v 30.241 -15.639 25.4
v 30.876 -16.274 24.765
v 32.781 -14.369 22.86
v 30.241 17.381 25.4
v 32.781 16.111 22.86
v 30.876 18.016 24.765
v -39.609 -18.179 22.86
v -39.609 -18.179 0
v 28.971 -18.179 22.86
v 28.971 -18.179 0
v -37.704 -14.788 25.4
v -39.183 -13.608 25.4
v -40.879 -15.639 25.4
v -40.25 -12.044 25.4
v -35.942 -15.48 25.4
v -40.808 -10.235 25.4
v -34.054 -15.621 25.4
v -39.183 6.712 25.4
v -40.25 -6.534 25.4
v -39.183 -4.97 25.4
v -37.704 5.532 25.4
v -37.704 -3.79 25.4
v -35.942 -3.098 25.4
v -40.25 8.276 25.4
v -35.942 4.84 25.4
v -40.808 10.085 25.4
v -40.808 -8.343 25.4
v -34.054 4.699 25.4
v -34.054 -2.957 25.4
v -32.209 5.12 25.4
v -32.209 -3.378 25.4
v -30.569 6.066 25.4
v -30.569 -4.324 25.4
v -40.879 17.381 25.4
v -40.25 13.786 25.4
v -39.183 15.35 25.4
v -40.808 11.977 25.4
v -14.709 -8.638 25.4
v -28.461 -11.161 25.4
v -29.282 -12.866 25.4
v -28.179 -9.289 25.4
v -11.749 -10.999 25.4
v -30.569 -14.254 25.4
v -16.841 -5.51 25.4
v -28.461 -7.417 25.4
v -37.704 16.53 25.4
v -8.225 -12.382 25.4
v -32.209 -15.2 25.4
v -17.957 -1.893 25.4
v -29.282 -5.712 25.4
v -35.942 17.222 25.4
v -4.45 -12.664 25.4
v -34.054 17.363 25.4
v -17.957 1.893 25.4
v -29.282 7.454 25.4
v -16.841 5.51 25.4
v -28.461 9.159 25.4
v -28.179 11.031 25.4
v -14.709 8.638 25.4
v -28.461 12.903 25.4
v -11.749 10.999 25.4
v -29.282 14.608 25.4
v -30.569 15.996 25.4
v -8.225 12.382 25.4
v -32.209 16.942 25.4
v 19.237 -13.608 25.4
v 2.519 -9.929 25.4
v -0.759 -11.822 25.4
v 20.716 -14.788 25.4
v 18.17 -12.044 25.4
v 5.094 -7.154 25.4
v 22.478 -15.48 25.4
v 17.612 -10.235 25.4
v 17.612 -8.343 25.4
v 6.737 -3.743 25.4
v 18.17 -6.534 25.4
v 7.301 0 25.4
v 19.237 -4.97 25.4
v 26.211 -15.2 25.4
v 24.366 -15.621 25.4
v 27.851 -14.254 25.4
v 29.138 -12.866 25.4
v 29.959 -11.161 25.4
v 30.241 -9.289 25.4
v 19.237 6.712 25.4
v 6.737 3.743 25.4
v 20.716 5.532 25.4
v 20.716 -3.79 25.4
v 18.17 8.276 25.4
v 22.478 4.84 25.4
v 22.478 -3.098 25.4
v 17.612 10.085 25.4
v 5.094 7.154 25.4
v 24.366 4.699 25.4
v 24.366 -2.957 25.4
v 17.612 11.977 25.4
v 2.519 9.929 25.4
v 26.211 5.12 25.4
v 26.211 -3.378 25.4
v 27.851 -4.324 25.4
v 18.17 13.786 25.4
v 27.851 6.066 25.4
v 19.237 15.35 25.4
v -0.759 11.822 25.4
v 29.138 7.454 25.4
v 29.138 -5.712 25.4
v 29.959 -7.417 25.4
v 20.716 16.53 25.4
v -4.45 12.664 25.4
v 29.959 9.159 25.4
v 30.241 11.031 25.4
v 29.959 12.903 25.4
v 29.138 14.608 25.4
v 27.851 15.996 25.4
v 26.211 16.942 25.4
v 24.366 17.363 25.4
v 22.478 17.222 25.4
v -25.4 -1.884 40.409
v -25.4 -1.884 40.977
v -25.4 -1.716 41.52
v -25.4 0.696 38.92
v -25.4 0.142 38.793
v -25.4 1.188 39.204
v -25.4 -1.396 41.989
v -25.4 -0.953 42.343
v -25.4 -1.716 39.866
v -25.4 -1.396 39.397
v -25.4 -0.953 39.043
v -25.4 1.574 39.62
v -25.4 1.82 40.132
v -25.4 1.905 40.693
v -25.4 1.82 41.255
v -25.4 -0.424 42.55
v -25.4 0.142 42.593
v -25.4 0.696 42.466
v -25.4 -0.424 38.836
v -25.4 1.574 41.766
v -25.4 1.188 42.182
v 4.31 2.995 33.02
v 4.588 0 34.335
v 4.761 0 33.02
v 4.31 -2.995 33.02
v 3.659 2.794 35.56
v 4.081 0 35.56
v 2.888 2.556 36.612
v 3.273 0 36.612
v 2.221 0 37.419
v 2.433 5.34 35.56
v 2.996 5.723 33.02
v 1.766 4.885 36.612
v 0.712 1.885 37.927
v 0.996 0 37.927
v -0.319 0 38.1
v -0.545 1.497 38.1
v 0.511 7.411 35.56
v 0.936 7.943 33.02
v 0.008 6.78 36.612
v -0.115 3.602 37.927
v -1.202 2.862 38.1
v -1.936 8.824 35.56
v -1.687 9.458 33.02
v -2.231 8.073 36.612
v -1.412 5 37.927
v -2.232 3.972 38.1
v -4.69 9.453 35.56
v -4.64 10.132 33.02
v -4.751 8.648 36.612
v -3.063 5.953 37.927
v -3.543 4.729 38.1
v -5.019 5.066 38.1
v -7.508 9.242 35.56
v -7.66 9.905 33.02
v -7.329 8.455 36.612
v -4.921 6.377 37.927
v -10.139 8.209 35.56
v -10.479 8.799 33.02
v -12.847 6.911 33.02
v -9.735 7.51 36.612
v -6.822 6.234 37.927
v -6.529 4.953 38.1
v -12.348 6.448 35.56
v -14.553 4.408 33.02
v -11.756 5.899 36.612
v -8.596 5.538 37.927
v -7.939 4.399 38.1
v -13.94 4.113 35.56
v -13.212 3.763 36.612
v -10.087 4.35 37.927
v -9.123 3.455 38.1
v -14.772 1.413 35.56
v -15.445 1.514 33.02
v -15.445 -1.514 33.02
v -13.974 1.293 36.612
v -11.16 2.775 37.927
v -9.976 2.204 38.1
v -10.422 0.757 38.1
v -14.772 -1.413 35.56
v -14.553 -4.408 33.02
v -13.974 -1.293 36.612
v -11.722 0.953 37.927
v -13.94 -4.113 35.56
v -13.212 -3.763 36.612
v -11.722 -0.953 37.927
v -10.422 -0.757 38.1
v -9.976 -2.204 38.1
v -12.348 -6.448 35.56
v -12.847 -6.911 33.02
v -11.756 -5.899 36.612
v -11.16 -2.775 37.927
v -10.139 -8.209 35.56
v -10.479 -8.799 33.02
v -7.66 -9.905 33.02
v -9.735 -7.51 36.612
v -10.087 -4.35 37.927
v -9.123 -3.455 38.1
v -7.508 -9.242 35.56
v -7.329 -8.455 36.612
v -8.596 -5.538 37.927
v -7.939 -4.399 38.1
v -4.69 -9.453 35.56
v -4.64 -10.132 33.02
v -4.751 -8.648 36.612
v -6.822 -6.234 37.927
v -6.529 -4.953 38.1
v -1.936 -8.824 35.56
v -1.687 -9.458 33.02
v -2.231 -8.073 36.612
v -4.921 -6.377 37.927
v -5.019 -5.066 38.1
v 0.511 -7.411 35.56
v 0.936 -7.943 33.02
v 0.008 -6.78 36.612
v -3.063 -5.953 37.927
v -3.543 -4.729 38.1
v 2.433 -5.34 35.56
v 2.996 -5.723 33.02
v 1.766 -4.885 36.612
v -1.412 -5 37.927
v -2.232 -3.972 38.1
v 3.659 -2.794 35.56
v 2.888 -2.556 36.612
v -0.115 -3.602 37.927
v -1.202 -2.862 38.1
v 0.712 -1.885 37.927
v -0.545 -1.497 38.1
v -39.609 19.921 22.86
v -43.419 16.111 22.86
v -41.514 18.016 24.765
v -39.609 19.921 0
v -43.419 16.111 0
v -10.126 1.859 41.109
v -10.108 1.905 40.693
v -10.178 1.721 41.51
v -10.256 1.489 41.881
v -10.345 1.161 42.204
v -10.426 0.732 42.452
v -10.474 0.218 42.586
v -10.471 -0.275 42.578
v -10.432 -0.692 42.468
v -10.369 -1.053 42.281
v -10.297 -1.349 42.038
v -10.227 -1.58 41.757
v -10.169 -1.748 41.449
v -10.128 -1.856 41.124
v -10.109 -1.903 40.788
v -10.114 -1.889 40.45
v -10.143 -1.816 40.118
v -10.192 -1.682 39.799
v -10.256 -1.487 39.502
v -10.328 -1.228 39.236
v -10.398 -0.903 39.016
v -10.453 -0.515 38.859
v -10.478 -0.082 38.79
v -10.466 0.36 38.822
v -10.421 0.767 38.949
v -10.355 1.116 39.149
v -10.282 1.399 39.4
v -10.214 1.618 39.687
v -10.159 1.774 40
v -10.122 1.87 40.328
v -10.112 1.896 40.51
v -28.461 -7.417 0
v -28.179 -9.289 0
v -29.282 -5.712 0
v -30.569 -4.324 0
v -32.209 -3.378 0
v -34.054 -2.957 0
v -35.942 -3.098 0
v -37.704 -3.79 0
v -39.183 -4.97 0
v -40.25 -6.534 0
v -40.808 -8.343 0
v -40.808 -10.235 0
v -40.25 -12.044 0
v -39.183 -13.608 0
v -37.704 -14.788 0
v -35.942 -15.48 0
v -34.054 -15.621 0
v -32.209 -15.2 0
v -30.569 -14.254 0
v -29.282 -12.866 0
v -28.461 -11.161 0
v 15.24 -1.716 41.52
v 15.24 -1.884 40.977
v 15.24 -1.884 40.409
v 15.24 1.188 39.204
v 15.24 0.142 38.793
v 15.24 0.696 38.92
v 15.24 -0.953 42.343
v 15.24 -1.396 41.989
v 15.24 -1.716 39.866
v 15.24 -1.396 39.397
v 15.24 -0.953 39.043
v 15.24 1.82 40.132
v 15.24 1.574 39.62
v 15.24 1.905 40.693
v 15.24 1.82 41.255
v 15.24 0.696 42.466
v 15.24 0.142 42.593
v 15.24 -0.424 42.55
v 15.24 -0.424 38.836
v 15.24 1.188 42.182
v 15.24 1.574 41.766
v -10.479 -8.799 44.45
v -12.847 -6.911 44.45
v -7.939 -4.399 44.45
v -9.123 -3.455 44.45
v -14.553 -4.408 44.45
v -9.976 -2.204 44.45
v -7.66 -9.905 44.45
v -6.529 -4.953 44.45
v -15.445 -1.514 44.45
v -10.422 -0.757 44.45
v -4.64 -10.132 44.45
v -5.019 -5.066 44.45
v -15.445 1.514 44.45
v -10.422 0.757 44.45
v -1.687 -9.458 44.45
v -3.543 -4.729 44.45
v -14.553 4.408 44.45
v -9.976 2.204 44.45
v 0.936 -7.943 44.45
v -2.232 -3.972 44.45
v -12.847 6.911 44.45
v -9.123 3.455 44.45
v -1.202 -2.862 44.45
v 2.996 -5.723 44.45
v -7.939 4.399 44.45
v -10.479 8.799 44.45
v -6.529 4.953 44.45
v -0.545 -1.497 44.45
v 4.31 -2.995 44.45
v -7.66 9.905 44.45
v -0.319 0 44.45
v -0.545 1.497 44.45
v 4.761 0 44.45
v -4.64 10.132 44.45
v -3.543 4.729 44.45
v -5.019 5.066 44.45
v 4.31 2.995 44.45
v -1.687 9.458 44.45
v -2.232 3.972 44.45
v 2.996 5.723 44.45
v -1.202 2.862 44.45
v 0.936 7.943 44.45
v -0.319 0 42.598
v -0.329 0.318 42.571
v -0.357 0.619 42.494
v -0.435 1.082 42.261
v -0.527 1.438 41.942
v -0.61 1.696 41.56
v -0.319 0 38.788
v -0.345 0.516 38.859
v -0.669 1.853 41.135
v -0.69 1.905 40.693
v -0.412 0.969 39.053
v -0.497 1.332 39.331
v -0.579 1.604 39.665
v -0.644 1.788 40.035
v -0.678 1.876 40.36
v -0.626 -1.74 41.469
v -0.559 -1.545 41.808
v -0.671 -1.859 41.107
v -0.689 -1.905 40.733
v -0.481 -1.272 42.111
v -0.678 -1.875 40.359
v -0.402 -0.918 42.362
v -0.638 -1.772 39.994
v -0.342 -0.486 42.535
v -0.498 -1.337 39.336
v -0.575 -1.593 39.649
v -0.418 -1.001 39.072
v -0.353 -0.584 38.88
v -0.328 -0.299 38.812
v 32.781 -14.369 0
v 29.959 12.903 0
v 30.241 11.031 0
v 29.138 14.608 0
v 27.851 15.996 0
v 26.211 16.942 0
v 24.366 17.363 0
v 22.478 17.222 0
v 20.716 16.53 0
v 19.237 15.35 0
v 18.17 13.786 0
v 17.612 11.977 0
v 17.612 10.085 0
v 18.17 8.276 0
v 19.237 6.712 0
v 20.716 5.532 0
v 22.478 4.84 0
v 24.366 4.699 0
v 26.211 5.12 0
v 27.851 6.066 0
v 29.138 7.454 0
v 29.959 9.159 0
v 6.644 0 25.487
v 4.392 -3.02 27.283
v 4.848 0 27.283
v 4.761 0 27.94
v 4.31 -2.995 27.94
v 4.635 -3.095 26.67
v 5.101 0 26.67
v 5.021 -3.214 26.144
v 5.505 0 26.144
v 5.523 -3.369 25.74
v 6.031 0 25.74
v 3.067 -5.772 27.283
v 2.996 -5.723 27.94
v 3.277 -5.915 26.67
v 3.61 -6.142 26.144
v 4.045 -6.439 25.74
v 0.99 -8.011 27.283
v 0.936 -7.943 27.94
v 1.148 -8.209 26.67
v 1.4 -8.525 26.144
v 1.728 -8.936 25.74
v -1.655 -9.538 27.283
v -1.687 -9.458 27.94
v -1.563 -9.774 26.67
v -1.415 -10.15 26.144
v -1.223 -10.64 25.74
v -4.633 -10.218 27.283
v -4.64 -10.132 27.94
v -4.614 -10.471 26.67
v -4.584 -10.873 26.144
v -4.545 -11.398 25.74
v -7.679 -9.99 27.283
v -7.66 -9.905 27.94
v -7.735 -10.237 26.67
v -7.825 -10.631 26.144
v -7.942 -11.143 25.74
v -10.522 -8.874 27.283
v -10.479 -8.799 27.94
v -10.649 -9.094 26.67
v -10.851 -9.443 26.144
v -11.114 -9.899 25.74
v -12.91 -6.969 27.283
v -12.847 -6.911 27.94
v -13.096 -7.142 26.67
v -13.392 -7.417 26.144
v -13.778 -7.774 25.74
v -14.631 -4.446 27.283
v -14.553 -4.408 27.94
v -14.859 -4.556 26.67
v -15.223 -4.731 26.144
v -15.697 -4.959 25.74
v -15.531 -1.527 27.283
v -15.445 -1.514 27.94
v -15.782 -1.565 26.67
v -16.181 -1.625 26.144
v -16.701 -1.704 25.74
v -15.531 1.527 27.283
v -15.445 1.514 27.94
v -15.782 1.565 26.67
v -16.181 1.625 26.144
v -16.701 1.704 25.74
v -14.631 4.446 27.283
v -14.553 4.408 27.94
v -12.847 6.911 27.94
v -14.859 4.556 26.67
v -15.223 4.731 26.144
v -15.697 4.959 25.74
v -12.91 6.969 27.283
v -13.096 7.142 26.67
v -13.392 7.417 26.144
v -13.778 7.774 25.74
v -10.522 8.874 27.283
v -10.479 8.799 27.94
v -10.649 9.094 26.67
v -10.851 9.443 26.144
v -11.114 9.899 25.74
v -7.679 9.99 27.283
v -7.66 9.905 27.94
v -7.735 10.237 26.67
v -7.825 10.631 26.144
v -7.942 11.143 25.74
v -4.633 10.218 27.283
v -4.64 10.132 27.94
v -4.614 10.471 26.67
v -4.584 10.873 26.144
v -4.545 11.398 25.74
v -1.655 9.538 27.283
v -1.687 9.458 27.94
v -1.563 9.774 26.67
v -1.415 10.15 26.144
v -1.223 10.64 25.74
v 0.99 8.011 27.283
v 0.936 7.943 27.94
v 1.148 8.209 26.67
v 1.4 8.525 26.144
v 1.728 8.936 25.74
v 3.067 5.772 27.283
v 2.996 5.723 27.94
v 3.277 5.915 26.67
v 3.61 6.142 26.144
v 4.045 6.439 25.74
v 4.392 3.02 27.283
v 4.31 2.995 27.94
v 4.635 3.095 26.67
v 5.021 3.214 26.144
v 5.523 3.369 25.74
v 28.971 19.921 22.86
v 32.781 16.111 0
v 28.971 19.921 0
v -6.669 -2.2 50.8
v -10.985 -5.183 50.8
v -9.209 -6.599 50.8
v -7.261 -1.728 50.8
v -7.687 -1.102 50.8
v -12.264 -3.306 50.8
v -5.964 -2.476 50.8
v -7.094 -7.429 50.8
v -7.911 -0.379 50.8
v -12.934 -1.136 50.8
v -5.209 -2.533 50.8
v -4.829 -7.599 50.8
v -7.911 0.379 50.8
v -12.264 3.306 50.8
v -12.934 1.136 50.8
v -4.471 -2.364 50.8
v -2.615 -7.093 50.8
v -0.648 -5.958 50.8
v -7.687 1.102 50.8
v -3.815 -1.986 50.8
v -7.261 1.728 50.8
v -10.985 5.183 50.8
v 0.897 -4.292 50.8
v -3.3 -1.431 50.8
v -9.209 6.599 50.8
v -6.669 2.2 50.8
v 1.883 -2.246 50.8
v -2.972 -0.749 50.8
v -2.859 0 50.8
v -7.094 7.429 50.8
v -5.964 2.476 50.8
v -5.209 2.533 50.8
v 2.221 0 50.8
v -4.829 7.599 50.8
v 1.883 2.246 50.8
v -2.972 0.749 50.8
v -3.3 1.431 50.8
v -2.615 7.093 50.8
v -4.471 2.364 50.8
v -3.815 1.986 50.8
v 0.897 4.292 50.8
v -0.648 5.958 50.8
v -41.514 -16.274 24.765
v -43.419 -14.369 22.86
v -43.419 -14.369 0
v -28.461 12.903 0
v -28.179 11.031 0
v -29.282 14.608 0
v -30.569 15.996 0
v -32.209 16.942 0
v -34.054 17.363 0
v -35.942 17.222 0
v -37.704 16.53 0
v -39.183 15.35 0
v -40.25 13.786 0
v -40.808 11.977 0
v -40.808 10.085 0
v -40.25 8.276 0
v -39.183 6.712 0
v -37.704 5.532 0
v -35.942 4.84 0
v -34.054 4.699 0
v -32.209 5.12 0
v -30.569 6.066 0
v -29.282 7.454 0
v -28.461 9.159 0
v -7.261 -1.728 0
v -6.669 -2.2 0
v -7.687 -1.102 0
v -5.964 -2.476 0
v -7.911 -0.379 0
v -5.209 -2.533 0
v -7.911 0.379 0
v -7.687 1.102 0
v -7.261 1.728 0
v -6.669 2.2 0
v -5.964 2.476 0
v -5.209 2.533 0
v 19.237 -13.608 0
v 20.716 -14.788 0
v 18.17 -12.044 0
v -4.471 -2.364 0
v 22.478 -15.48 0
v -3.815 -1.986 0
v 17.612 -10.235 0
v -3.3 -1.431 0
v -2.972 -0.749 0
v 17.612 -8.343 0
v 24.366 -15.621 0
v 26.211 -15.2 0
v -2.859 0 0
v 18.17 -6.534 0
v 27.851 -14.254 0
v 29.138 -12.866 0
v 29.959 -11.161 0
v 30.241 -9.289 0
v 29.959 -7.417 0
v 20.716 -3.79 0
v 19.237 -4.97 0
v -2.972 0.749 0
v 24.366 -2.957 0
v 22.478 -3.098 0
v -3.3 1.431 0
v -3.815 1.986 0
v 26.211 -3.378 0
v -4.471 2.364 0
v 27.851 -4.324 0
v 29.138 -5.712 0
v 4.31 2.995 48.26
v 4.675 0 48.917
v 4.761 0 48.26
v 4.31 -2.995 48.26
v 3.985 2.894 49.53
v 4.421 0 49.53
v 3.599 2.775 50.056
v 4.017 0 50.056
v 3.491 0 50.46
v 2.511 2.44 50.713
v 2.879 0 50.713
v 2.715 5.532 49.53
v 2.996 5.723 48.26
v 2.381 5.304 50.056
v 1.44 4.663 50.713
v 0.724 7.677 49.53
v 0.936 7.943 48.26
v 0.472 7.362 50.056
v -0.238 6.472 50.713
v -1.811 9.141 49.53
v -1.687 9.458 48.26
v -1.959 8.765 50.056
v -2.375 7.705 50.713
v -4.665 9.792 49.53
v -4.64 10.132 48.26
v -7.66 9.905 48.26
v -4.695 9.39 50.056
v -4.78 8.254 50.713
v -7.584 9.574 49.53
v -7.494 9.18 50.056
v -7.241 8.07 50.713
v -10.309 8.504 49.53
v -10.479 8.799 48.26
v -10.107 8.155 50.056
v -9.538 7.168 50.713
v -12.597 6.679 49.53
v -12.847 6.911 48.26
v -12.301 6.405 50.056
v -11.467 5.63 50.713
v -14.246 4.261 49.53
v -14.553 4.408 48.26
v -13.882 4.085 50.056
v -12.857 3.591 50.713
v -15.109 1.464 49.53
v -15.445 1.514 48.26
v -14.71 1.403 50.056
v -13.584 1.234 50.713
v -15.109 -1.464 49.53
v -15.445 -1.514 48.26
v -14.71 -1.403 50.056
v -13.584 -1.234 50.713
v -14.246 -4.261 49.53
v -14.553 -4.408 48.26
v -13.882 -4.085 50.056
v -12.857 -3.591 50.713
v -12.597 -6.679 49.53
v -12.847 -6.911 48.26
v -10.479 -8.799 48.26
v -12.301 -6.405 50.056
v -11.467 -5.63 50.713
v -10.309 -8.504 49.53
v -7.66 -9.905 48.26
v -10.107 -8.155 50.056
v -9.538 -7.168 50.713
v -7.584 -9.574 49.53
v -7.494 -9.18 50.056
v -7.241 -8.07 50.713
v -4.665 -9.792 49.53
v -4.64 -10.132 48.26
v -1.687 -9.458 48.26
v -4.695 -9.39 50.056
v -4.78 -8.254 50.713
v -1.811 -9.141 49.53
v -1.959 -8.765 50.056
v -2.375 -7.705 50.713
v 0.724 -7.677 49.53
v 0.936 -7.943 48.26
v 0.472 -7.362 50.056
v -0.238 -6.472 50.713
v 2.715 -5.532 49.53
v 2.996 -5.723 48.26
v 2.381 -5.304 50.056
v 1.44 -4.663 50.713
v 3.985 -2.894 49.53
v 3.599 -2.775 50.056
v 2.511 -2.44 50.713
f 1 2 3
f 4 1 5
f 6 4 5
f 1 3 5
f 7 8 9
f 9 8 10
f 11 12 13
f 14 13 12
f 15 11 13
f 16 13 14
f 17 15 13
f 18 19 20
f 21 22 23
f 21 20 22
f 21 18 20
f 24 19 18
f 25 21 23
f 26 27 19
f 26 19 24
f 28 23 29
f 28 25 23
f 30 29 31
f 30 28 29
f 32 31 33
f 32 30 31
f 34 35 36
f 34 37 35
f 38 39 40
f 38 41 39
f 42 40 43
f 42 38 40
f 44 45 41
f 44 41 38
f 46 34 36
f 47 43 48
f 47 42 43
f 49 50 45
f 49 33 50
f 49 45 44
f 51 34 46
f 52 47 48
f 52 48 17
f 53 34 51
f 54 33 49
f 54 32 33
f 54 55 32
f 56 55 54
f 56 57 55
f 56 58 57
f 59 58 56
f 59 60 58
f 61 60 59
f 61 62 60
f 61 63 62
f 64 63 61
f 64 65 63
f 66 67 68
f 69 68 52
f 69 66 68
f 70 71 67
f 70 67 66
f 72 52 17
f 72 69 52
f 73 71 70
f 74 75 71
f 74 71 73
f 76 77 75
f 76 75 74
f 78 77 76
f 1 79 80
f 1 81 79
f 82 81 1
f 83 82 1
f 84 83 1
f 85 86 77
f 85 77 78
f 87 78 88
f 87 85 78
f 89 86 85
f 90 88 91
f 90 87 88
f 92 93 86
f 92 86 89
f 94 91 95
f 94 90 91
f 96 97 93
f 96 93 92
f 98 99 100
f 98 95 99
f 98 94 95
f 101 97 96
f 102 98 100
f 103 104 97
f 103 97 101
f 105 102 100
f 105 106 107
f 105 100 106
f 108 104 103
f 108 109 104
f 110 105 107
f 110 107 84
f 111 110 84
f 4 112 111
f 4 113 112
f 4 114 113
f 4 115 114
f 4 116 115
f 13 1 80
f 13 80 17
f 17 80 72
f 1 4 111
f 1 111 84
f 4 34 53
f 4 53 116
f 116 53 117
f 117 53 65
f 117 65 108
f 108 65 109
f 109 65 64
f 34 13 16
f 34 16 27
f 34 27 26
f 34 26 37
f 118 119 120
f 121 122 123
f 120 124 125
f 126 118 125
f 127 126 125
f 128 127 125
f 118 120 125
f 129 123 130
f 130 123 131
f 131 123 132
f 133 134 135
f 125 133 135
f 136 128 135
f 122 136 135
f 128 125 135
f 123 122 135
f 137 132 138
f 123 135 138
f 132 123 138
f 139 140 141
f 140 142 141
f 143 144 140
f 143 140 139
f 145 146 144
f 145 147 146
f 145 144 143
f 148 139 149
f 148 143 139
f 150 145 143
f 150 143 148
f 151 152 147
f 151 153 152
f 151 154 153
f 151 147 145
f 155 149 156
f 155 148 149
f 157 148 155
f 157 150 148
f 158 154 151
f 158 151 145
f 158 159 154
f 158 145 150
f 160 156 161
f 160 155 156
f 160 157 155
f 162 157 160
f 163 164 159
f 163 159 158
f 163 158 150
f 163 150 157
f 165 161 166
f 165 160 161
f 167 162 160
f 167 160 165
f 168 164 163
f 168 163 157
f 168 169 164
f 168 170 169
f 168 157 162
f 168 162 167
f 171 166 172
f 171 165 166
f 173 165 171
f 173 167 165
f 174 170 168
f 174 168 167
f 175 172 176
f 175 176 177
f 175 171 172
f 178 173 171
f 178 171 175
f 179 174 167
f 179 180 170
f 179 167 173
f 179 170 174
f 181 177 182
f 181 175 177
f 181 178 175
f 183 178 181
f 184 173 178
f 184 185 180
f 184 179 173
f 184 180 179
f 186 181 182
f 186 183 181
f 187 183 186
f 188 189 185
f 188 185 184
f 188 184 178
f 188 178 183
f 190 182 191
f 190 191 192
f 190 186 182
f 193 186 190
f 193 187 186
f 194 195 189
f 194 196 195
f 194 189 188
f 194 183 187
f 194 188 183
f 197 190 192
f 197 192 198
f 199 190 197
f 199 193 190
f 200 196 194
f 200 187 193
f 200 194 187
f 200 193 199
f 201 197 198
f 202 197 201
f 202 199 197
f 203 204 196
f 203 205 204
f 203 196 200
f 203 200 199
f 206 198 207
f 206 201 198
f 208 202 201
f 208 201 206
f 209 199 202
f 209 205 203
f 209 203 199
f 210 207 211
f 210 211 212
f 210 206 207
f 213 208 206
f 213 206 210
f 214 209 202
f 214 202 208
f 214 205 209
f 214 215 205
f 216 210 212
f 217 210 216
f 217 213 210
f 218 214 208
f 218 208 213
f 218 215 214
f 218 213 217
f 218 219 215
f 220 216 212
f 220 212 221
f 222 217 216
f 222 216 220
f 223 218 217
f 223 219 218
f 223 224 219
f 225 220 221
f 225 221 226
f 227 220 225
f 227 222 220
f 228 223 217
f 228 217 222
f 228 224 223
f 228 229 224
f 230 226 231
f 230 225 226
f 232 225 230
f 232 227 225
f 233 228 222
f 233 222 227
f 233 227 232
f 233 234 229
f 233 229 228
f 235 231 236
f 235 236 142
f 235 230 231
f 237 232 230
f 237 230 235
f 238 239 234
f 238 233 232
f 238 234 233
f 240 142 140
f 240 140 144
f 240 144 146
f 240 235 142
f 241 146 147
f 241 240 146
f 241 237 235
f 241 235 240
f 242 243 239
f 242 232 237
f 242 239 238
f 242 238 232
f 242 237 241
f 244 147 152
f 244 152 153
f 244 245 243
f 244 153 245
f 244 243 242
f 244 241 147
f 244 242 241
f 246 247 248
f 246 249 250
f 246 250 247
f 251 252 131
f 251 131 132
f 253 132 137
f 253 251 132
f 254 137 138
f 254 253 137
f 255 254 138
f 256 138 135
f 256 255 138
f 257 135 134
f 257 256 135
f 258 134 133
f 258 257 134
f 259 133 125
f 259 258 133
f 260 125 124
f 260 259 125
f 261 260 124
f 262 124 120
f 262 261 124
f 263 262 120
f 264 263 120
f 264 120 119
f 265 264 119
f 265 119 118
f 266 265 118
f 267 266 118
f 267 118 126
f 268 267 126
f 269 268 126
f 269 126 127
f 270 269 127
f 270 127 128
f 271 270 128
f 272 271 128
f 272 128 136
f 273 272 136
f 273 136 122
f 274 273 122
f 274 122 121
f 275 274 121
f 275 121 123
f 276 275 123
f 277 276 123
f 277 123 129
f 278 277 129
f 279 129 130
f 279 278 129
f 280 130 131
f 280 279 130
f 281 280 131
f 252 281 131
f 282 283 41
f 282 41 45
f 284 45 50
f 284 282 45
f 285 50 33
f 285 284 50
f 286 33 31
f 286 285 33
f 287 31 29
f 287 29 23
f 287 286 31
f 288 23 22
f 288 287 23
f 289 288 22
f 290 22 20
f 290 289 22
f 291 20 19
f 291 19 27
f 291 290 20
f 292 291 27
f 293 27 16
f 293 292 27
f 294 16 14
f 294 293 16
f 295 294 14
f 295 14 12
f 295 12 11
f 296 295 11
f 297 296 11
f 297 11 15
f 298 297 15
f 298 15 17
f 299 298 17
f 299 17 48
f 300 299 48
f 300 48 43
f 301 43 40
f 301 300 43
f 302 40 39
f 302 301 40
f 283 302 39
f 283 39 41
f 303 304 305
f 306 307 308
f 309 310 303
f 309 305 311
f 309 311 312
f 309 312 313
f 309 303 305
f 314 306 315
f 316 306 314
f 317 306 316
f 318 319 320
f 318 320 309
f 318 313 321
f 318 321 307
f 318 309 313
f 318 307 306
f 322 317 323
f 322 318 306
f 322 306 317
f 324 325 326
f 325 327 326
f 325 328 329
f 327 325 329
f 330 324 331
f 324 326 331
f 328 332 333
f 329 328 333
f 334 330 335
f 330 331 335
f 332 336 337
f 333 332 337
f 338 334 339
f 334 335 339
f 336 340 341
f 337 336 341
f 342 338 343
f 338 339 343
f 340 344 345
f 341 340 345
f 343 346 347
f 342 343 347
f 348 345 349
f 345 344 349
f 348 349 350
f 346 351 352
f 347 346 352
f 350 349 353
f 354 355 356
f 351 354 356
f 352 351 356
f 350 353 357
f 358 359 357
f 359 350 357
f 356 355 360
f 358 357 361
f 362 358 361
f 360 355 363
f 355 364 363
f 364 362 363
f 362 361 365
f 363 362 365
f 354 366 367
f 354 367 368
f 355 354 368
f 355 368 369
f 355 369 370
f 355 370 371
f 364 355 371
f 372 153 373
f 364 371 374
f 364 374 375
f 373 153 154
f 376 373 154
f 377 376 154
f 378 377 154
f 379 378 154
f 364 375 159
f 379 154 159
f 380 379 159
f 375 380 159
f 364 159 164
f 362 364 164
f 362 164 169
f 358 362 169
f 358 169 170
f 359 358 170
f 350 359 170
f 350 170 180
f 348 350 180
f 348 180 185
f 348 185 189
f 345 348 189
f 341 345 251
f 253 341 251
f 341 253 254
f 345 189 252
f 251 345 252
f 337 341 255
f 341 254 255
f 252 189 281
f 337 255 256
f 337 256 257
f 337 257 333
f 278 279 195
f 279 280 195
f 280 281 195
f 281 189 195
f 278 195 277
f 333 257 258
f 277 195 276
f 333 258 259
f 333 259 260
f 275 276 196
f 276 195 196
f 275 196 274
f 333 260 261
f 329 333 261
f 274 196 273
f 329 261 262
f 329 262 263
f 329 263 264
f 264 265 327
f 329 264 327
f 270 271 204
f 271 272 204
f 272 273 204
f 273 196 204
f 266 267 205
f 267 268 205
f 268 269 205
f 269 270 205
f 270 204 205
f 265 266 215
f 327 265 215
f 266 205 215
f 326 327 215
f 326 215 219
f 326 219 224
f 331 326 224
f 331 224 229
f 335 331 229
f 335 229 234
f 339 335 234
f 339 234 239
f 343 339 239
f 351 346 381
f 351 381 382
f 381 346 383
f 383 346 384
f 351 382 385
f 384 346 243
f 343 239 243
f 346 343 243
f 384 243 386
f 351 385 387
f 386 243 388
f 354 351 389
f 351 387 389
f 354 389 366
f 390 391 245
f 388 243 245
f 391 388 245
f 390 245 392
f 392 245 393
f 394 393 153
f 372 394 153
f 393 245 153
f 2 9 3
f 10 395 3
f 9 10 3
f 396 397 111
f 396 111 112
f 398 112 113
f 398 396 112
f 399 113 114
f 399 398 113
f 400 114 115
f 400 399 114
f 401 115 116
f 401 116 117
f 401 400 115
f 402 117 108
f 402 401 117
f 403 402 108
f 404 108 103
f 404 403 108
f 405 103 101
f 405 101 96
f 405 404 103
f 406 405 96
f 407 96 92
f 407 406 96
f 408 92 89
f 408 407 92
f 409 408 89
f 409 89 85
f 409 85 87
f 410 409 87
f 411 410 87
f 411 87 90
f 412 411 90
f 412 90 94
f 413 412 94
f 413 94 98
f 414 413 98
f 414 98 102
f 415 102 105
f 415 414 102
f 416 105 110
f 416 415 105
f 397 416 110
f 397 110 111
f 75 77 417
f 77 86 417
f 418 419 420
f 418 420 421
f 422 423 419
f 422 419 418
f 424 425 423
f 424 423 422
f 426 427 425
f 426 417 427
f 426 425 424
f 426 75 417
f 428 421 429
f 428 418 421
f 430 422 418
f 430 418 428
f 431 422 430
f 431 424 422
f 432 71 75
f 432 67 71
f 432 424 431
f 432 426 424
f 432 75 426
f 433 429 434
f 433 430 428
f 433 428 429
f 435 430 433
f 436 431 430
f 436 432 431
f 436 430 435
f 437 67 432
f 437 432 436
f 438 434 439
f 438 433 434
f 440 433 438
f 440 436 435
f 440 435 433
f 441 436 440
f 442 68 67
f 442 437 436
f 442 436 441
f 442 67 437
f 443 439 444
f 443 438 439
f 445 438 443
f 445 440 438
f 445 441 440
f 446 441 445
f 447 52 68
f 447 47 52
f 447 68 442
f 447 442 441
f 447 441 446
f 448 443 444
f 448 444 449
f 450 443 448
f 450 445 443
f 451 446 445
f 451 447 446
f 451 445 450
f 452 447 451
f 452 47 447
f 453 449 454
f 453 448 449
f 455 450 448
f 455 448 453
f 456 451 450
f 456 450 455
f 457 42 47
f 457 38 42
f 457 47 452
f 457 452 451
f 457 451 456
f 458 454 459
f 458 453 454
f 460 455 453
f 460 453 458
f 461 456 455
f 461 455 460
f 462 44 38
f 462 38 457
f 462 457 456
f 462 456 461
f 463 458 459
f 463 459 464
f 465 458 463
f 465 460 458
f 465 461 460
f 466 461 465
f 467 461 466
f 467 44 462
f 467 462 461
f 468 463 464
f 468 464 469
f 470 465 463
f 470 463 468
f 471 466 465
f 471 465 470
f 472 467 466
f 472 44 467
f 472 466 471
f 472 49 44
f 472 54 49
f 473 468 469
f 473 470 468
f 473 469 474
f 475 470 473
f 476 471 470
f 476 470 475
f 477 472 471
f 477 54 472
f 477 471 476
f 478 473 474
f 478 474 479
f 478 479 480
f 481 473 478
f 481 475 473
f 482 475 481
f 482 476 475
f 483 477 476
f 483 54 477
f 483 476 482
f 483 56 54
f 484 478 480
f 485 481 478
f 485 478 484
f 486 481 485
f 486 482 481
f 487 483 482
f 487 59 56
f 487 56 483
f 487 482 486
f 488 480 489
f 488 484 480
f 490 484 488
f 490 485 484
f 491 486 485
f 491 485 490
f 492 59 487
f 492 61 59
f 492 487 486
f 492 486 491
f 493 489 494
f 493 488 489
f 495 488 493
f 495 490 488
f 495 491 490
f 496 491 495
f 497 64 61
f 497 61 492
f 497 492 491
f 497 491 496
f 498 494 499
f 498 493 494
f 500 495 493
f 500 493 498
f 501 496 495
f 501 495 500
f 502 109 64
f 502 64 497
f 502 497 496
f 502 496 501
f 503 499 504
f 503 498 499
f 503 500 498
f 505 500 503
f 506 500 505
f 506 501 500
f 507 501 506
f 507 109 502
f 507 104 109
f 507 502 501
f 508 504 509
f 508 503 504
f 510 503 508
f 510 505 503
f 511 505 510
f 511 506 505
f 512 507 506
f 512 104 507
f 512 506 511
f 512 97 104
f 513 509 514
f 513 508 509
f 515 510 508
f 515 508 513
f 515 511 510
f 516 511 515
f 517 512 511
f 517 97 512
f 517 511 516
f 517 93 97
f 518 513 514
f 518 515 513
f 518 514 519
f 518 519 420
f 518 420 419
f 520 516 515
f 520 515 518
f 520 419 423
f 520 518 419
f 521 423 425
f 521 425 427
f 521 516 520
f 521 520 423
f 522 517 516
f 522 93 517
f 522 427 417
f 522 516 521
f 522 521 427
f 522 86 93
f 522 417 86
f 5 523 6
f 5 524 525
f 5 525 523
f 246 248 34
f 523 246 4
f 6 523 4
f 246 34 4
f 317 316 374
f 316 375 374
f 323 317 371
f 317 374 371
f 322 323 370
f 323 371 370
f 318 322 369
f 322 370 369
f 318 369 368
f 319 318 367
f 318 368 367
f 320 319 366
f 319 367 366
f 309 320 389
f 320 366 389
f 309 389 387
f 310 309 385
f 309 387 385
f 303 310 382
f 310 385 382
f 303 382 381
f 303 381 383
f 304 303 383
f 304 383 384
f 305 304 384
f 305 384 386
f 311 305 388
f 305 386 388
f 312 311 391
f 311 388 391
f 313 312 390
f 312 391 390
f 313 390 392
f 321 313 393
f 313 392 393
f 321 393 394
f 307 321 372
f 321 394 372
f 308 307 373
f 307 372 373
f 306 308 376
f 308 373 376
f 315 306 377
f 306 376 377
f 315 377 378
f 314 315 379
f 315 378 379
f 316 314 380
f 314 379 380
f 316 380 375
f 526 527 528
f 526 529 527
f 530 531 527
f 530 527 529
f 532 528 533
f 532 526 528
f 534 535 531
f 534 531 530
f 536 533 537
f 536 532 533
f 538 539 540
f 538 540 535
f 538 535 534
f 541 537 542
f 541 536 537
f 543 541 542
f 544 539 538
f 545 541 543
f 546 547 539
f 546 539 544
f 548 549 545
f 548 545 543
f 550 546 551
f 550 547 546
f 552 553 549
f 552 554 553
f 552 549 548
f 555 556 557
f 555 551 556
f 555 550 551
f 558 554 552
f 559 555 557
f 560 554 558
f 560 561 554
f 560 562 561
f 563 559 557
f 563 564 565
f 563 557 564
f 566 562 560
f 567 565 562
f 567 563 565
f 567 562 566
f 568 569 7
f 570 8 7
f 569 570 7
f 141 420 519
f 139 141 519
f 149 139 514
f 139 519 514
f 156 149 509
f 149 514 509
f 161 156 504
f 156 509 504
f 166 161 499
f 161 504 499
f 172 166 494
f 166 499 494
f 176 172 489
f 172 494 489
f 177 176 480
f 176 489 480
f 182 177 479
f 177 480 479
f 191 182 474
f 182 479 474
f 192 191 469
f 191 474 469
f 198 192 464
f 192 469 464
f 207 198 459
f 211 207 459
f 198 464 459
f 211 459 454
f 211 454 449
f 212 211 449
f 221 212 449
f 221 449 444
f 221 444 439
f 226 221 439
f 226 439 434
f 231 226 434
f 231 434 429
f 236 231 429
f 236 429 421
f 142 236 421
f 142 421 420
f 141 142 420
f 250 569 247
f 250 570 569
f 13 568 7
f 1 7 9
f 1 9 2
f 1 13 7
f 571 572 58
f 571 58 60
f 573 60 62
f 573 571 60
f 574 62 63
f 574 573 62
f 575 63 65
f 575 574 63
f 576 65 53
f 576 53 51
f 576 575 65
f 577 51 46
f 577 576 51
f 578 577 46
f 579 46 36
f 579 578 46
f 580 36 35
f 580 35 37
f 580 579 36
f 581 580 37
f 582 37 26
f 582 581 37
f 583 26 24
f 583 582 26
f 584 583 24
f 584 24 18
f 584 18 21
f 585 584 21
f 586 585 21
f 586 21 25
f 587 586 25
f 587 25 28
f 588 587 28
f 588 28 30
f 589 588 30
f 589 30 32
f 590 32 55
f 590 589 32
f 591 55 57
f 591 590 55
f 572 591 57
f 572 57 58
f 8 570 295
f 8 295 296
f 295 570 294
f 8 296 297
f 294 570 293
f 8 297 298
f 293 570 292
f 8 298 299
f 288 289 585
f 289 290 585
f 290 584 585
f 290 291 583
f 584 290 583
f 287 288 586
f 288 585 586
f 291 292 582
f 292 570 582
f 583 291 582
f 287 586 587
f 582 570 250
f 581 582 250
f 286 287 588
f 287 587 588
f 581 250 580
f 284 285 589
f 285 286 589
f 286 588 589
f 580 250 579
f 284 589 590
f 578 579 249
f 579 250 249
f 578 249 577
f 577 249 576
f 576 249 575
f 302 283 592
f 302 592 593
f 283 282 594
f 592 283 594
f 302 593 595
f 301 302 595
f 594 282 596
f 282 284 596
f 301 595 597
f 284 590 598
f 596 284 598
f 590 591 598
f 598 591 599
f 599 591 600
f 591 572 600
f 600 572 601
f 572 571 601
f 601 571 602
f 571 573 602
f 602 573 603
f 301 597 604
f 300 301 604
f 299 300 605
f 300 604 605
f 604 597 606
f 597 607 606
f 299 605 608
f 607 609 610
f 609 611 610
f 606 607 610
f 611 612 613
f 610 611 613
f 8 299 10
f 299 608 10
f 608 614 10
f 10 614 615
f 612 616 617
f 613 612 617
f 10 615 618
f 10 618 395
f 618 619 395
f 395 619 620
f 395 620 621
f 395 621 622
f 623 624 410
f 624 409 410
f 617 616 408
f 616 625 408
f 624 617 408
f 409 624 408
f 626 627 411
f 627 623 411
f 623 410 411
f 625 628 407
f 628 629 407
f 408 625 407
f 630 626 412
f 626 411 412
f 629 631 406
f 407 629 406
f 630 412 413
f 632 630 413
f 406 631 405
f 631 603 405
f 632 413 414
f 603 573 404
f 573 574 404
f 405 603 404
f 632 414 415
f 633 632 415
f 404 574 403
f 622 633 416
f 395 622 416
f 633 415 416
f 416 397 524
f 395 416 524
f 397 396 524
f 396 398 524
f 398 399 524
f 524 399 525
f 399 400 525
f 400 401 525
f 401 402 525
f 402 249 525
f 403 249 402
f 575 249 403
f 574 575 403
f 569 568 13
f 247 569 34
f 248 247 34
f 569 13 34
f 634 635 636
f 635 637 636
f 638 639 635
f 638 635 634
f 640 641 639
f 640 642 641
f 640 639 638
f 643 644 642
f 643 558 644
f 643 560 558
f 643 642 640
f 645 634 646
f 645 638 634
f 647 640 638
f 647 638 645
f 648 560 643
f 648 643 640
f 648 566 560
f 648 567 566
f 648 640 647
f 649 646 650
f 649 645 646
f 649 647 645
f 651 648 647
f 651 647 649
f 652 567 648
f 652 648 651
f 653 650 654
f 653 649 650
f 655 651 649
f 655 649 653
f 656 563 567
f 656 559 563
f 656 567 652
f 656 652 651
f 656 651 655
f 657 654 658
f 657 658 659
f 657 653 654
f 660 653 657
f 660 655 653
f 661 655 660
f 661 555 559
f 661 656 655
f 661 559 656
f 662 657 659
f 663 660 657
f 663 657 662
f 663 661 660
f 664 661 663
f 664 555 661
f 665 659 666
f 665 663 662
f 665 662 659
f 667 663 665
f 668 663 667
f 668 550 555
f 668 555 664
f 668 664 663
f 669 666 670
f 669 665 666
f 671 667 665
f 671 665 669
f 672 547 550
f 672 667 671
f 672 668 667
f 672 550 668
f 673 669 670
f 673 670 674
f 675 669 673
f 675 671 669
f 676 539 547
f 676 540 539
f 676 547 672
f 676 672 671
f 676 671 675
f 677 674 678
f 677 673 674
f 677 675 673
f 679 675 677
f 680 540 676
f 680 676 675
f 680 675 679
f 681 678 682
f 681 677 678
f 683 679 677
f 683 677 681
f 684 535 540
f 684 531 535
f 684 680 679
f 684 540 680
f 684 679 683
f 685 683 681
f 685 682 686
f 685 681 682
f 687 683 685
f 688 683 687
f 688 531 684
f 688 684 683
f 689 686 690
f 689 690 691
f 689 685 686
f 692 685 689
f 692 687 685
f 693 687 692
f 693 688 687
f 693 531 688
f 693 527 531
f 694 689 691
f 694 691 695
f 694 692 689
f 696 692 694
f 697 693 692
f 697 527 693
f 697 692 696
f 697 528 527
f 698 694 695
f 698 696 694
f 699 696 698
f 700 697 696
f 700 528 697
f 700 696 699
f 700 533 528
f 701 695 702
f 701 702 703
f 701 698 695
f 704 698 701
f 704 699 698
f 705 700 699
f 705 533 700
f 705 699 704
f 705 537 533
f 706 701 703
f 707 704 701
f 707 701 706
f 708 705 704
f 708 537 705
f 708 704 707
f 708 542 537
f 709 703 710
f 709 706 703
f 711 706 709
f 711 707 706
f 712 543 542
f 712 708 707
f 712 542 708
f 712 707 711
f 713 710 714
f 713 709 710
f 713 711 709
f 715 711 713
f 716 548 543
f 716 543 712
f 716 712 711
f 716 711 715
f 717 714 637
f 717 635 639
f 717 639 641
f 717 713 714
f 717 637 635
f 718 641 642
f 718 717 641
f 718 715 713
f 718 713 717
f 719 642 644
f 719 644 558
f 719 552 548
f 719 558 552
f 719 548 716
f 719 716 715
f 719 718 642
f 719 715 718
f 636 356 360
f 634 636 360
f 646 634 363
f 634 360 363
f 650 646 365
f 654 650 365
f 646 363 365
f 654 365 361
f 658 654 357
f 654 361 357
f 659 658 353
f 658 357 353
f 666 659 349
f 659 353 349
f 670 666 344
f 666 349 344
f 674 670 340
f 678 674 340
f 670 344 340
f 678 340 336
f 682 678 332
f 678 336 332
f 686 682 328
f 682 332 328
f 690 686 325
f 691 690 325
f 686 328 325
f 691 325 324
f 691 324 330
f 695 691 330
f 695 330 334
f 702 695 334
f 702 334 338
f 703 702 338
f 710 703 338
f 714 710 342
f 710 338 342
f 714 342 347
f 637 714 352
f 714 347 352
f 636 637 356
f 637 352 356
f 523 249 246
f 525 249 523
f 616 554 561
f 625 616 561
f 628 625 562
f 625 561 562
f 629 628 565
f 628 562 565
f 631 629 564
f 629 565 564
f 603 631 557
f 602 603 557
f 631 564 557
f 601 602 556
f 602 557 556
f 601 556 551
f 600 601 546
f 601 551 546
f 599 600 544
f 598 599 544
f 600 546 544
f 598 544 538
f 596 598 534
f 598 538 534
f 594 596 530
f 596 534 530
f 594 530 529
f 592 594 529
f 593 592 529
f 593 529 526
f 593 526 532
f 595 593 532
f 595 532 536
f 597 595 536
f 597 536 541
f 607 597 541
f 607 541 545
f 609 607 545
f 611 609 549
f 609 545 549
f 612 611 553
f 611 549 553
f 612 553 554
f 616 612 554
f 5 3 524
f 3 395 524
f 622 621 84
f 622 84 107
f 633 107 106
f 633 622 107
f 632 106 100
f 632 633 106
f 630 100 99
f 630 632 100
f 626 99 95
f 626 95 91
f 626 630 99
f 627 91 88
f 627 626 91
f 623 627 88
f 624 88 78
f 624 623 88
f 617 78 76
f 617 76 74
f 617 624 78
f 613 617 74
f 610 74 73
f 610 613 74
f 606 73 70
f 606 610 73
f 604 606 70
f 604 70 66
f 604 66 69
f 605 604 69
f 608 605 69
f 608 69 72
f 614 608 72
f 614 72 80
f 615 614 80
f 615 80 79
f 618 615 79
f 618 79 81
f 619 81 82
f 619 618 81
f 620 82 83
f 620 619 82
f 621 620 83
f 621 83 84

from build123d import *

# Parameters (mm, degrees)
F0_W      = 76.2
F0_H      = 38.1
F1_DEPTH  = 25.4
F2_R      = 6.35
F1_FACE_W = 76.2
F1_FACE_H = 38.1
F3_DEPTH  = 25.4
F4_SIZE   = 2.53999
F5_R      = 10.16
F6_DEPTH  = 38.1
F7_R      = 5.08
F8_DEPTH  = 6.35
F9_R      = 10.16
F10_DEPTH = 6.35
F11_R     = 1.905
F12_DEPTH = 25.4
F13_DEPTH = 15.24
F14_R     = 2.54
F15_R     = 2.54
F16_R     = 2.54
F17_DEPTH = 50.8
F18_SIZE  = 3.81
F19_R     = 5.07999


# Not quite as in the source:
# - a fillet or chamfer is up to 0.001 mm smaller than in the source, because OpenCascade refuses the exact size


with BuildPart() as f1:
    # F0 (on Top) → F1 (new body)
    with BuildSketch(Plane.XY):
        with Locations((-5.318582058, 0.8709464072)):
            Rectangle(F0_W, F0_H)
    extrude(amount=F1_DEPTH)

    # F2 (on Top) + F1_face (on face) → F3 (cut)
    with BuildSketch(Plane.XY):
        with Locations((-34.528582058, -9.2890535928)):
            Circle(F2_R)
        with Locations((23.891417942, 11.0309464072)):
            Circle(F2_R)
        with Locations((23.891417942, -9.2890535928)):
            Circle(F2_R)
        with Locations((-34.528582058, 11.0309464072)):
            Circle(F2_R)
    with BuildSketch(Plane(origin=(-5.318582058, 0.8709464072, 25.4), x_dir=(1, 0, 0), z_dir=(0, 0, 1))):
        Rectangle(F1_FACE_W, F1_FACE_H)
    extrude(amount=F3_DEPTH, mode=Mode.SUBTRACT)

    # F4 (size 2.54 in the source; OpenCascade refuses exactly that, so slightly less here)
    f4_edges = [f1.edges().sort_by_distance(p)[0] for p in [
        (-5.318582, -18.179054, 25.4),
        (32.781418, 0.870946, 25.4),
        (-5.318582, 19.920946, 25.4),
        (-43.418582, 0.870946, 25.4),
    ]]
    chamfer(f4_edges, length=F4_SIZE)

    # F5 (on Top) → F6 (join)
    with BuildSketch(Plane.XY):
        with Locations((-5.3988754862, 0)):
            Circle(F5_R)
    extrude(amount=F6_DEPTH)

    # F7 (on face) → F8 (join)
    with BuildSketch(Plane.XY.offset(38.1)):
        with Locations((-5.3988754862, 0)):
            Circle(F7_R)
    extrude(amount=F8_DEPTH)

    # F9 (on face) → F10 (join)
    with BuildSketch(Plane.XY.offset(44.45)):
        with Locations((-5.3988754862, 0)):
            Circle(F9_R)
    extrude(amount=F10_DEPTH)

    # F11 (on Right) → F12 (join)
    with BuildSketch(Plane.YZ):
        with Locations((0, 40.6930105954)):
            Circle(F11_R)
    extrude(amount=-F12_DEPTH)

    # F11 (on Right) → F13 (join)
    with BuildSketch(Plane.YZ):
        with Locations((0, 40.6930105954)):
            Circle(F11_R)
    extrude(amount=F13_DEPTH)

    # F14
    f14_edges = [f1.edges().sort_by_distance(p)[0] for p in [
        (-15.558875, 0, 25.4),
    ]]
    fillet(f14_edges, radius=F14_R)

    # F15
    f15_edges = [f1.edges().sort_by_distance(p)[0] for p in [
        (-15.558875, 0, 50.8),
    ]]
    fillet(f15_edges, radius=F15_R)

    # F16 (on face) → F17 (cut)
    with BuildSketch(Plane.XY.offset(50.8)):
        with Locations((-5.3988754862, 0)):
            Circle(F16_R)
    extrude(amount=-F17_DEPTH, mode=Mode.SUBTRACT)

    # F18
    f18_edges = [f1.edges().sort_by_distance(p)[0] for p in [
        (32.781418, -18.179054, 11.430005),
        (-43.418582, -18.179054, 11.430005),
        (32.781418, 19.920946, 11.430005),
        (-43.418582, 19.920946, 11.430005),
    ]]
    chamfer(f18_edges, length=F18_SIZE)

    # F19 (radius 5.08 in the source; OpenCascade refuses exactly that, so slightly less here)
    f19_edges = [f1.edges().sort_by_distance(p)[0] for p in [
        (-15.558875, 0, 38.1),
    ]]
    fillet(f19_edges, radius=F19_R)


solid = f1.part
